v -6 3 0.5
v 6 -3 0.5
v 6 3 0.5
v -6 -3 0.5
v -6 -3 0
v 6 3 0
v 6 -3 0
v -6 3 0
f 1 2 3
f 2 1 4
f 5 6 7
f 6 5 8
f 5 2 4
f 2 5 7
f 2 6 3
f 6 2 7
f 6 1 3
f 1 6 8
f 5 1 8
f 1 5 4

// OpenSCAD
module backboard(){
    color([1,1,1])
    translate([0,3,1/4]) cube([12,6,1/2],center=true);
}
translate([0,-3,0]) backboard();
